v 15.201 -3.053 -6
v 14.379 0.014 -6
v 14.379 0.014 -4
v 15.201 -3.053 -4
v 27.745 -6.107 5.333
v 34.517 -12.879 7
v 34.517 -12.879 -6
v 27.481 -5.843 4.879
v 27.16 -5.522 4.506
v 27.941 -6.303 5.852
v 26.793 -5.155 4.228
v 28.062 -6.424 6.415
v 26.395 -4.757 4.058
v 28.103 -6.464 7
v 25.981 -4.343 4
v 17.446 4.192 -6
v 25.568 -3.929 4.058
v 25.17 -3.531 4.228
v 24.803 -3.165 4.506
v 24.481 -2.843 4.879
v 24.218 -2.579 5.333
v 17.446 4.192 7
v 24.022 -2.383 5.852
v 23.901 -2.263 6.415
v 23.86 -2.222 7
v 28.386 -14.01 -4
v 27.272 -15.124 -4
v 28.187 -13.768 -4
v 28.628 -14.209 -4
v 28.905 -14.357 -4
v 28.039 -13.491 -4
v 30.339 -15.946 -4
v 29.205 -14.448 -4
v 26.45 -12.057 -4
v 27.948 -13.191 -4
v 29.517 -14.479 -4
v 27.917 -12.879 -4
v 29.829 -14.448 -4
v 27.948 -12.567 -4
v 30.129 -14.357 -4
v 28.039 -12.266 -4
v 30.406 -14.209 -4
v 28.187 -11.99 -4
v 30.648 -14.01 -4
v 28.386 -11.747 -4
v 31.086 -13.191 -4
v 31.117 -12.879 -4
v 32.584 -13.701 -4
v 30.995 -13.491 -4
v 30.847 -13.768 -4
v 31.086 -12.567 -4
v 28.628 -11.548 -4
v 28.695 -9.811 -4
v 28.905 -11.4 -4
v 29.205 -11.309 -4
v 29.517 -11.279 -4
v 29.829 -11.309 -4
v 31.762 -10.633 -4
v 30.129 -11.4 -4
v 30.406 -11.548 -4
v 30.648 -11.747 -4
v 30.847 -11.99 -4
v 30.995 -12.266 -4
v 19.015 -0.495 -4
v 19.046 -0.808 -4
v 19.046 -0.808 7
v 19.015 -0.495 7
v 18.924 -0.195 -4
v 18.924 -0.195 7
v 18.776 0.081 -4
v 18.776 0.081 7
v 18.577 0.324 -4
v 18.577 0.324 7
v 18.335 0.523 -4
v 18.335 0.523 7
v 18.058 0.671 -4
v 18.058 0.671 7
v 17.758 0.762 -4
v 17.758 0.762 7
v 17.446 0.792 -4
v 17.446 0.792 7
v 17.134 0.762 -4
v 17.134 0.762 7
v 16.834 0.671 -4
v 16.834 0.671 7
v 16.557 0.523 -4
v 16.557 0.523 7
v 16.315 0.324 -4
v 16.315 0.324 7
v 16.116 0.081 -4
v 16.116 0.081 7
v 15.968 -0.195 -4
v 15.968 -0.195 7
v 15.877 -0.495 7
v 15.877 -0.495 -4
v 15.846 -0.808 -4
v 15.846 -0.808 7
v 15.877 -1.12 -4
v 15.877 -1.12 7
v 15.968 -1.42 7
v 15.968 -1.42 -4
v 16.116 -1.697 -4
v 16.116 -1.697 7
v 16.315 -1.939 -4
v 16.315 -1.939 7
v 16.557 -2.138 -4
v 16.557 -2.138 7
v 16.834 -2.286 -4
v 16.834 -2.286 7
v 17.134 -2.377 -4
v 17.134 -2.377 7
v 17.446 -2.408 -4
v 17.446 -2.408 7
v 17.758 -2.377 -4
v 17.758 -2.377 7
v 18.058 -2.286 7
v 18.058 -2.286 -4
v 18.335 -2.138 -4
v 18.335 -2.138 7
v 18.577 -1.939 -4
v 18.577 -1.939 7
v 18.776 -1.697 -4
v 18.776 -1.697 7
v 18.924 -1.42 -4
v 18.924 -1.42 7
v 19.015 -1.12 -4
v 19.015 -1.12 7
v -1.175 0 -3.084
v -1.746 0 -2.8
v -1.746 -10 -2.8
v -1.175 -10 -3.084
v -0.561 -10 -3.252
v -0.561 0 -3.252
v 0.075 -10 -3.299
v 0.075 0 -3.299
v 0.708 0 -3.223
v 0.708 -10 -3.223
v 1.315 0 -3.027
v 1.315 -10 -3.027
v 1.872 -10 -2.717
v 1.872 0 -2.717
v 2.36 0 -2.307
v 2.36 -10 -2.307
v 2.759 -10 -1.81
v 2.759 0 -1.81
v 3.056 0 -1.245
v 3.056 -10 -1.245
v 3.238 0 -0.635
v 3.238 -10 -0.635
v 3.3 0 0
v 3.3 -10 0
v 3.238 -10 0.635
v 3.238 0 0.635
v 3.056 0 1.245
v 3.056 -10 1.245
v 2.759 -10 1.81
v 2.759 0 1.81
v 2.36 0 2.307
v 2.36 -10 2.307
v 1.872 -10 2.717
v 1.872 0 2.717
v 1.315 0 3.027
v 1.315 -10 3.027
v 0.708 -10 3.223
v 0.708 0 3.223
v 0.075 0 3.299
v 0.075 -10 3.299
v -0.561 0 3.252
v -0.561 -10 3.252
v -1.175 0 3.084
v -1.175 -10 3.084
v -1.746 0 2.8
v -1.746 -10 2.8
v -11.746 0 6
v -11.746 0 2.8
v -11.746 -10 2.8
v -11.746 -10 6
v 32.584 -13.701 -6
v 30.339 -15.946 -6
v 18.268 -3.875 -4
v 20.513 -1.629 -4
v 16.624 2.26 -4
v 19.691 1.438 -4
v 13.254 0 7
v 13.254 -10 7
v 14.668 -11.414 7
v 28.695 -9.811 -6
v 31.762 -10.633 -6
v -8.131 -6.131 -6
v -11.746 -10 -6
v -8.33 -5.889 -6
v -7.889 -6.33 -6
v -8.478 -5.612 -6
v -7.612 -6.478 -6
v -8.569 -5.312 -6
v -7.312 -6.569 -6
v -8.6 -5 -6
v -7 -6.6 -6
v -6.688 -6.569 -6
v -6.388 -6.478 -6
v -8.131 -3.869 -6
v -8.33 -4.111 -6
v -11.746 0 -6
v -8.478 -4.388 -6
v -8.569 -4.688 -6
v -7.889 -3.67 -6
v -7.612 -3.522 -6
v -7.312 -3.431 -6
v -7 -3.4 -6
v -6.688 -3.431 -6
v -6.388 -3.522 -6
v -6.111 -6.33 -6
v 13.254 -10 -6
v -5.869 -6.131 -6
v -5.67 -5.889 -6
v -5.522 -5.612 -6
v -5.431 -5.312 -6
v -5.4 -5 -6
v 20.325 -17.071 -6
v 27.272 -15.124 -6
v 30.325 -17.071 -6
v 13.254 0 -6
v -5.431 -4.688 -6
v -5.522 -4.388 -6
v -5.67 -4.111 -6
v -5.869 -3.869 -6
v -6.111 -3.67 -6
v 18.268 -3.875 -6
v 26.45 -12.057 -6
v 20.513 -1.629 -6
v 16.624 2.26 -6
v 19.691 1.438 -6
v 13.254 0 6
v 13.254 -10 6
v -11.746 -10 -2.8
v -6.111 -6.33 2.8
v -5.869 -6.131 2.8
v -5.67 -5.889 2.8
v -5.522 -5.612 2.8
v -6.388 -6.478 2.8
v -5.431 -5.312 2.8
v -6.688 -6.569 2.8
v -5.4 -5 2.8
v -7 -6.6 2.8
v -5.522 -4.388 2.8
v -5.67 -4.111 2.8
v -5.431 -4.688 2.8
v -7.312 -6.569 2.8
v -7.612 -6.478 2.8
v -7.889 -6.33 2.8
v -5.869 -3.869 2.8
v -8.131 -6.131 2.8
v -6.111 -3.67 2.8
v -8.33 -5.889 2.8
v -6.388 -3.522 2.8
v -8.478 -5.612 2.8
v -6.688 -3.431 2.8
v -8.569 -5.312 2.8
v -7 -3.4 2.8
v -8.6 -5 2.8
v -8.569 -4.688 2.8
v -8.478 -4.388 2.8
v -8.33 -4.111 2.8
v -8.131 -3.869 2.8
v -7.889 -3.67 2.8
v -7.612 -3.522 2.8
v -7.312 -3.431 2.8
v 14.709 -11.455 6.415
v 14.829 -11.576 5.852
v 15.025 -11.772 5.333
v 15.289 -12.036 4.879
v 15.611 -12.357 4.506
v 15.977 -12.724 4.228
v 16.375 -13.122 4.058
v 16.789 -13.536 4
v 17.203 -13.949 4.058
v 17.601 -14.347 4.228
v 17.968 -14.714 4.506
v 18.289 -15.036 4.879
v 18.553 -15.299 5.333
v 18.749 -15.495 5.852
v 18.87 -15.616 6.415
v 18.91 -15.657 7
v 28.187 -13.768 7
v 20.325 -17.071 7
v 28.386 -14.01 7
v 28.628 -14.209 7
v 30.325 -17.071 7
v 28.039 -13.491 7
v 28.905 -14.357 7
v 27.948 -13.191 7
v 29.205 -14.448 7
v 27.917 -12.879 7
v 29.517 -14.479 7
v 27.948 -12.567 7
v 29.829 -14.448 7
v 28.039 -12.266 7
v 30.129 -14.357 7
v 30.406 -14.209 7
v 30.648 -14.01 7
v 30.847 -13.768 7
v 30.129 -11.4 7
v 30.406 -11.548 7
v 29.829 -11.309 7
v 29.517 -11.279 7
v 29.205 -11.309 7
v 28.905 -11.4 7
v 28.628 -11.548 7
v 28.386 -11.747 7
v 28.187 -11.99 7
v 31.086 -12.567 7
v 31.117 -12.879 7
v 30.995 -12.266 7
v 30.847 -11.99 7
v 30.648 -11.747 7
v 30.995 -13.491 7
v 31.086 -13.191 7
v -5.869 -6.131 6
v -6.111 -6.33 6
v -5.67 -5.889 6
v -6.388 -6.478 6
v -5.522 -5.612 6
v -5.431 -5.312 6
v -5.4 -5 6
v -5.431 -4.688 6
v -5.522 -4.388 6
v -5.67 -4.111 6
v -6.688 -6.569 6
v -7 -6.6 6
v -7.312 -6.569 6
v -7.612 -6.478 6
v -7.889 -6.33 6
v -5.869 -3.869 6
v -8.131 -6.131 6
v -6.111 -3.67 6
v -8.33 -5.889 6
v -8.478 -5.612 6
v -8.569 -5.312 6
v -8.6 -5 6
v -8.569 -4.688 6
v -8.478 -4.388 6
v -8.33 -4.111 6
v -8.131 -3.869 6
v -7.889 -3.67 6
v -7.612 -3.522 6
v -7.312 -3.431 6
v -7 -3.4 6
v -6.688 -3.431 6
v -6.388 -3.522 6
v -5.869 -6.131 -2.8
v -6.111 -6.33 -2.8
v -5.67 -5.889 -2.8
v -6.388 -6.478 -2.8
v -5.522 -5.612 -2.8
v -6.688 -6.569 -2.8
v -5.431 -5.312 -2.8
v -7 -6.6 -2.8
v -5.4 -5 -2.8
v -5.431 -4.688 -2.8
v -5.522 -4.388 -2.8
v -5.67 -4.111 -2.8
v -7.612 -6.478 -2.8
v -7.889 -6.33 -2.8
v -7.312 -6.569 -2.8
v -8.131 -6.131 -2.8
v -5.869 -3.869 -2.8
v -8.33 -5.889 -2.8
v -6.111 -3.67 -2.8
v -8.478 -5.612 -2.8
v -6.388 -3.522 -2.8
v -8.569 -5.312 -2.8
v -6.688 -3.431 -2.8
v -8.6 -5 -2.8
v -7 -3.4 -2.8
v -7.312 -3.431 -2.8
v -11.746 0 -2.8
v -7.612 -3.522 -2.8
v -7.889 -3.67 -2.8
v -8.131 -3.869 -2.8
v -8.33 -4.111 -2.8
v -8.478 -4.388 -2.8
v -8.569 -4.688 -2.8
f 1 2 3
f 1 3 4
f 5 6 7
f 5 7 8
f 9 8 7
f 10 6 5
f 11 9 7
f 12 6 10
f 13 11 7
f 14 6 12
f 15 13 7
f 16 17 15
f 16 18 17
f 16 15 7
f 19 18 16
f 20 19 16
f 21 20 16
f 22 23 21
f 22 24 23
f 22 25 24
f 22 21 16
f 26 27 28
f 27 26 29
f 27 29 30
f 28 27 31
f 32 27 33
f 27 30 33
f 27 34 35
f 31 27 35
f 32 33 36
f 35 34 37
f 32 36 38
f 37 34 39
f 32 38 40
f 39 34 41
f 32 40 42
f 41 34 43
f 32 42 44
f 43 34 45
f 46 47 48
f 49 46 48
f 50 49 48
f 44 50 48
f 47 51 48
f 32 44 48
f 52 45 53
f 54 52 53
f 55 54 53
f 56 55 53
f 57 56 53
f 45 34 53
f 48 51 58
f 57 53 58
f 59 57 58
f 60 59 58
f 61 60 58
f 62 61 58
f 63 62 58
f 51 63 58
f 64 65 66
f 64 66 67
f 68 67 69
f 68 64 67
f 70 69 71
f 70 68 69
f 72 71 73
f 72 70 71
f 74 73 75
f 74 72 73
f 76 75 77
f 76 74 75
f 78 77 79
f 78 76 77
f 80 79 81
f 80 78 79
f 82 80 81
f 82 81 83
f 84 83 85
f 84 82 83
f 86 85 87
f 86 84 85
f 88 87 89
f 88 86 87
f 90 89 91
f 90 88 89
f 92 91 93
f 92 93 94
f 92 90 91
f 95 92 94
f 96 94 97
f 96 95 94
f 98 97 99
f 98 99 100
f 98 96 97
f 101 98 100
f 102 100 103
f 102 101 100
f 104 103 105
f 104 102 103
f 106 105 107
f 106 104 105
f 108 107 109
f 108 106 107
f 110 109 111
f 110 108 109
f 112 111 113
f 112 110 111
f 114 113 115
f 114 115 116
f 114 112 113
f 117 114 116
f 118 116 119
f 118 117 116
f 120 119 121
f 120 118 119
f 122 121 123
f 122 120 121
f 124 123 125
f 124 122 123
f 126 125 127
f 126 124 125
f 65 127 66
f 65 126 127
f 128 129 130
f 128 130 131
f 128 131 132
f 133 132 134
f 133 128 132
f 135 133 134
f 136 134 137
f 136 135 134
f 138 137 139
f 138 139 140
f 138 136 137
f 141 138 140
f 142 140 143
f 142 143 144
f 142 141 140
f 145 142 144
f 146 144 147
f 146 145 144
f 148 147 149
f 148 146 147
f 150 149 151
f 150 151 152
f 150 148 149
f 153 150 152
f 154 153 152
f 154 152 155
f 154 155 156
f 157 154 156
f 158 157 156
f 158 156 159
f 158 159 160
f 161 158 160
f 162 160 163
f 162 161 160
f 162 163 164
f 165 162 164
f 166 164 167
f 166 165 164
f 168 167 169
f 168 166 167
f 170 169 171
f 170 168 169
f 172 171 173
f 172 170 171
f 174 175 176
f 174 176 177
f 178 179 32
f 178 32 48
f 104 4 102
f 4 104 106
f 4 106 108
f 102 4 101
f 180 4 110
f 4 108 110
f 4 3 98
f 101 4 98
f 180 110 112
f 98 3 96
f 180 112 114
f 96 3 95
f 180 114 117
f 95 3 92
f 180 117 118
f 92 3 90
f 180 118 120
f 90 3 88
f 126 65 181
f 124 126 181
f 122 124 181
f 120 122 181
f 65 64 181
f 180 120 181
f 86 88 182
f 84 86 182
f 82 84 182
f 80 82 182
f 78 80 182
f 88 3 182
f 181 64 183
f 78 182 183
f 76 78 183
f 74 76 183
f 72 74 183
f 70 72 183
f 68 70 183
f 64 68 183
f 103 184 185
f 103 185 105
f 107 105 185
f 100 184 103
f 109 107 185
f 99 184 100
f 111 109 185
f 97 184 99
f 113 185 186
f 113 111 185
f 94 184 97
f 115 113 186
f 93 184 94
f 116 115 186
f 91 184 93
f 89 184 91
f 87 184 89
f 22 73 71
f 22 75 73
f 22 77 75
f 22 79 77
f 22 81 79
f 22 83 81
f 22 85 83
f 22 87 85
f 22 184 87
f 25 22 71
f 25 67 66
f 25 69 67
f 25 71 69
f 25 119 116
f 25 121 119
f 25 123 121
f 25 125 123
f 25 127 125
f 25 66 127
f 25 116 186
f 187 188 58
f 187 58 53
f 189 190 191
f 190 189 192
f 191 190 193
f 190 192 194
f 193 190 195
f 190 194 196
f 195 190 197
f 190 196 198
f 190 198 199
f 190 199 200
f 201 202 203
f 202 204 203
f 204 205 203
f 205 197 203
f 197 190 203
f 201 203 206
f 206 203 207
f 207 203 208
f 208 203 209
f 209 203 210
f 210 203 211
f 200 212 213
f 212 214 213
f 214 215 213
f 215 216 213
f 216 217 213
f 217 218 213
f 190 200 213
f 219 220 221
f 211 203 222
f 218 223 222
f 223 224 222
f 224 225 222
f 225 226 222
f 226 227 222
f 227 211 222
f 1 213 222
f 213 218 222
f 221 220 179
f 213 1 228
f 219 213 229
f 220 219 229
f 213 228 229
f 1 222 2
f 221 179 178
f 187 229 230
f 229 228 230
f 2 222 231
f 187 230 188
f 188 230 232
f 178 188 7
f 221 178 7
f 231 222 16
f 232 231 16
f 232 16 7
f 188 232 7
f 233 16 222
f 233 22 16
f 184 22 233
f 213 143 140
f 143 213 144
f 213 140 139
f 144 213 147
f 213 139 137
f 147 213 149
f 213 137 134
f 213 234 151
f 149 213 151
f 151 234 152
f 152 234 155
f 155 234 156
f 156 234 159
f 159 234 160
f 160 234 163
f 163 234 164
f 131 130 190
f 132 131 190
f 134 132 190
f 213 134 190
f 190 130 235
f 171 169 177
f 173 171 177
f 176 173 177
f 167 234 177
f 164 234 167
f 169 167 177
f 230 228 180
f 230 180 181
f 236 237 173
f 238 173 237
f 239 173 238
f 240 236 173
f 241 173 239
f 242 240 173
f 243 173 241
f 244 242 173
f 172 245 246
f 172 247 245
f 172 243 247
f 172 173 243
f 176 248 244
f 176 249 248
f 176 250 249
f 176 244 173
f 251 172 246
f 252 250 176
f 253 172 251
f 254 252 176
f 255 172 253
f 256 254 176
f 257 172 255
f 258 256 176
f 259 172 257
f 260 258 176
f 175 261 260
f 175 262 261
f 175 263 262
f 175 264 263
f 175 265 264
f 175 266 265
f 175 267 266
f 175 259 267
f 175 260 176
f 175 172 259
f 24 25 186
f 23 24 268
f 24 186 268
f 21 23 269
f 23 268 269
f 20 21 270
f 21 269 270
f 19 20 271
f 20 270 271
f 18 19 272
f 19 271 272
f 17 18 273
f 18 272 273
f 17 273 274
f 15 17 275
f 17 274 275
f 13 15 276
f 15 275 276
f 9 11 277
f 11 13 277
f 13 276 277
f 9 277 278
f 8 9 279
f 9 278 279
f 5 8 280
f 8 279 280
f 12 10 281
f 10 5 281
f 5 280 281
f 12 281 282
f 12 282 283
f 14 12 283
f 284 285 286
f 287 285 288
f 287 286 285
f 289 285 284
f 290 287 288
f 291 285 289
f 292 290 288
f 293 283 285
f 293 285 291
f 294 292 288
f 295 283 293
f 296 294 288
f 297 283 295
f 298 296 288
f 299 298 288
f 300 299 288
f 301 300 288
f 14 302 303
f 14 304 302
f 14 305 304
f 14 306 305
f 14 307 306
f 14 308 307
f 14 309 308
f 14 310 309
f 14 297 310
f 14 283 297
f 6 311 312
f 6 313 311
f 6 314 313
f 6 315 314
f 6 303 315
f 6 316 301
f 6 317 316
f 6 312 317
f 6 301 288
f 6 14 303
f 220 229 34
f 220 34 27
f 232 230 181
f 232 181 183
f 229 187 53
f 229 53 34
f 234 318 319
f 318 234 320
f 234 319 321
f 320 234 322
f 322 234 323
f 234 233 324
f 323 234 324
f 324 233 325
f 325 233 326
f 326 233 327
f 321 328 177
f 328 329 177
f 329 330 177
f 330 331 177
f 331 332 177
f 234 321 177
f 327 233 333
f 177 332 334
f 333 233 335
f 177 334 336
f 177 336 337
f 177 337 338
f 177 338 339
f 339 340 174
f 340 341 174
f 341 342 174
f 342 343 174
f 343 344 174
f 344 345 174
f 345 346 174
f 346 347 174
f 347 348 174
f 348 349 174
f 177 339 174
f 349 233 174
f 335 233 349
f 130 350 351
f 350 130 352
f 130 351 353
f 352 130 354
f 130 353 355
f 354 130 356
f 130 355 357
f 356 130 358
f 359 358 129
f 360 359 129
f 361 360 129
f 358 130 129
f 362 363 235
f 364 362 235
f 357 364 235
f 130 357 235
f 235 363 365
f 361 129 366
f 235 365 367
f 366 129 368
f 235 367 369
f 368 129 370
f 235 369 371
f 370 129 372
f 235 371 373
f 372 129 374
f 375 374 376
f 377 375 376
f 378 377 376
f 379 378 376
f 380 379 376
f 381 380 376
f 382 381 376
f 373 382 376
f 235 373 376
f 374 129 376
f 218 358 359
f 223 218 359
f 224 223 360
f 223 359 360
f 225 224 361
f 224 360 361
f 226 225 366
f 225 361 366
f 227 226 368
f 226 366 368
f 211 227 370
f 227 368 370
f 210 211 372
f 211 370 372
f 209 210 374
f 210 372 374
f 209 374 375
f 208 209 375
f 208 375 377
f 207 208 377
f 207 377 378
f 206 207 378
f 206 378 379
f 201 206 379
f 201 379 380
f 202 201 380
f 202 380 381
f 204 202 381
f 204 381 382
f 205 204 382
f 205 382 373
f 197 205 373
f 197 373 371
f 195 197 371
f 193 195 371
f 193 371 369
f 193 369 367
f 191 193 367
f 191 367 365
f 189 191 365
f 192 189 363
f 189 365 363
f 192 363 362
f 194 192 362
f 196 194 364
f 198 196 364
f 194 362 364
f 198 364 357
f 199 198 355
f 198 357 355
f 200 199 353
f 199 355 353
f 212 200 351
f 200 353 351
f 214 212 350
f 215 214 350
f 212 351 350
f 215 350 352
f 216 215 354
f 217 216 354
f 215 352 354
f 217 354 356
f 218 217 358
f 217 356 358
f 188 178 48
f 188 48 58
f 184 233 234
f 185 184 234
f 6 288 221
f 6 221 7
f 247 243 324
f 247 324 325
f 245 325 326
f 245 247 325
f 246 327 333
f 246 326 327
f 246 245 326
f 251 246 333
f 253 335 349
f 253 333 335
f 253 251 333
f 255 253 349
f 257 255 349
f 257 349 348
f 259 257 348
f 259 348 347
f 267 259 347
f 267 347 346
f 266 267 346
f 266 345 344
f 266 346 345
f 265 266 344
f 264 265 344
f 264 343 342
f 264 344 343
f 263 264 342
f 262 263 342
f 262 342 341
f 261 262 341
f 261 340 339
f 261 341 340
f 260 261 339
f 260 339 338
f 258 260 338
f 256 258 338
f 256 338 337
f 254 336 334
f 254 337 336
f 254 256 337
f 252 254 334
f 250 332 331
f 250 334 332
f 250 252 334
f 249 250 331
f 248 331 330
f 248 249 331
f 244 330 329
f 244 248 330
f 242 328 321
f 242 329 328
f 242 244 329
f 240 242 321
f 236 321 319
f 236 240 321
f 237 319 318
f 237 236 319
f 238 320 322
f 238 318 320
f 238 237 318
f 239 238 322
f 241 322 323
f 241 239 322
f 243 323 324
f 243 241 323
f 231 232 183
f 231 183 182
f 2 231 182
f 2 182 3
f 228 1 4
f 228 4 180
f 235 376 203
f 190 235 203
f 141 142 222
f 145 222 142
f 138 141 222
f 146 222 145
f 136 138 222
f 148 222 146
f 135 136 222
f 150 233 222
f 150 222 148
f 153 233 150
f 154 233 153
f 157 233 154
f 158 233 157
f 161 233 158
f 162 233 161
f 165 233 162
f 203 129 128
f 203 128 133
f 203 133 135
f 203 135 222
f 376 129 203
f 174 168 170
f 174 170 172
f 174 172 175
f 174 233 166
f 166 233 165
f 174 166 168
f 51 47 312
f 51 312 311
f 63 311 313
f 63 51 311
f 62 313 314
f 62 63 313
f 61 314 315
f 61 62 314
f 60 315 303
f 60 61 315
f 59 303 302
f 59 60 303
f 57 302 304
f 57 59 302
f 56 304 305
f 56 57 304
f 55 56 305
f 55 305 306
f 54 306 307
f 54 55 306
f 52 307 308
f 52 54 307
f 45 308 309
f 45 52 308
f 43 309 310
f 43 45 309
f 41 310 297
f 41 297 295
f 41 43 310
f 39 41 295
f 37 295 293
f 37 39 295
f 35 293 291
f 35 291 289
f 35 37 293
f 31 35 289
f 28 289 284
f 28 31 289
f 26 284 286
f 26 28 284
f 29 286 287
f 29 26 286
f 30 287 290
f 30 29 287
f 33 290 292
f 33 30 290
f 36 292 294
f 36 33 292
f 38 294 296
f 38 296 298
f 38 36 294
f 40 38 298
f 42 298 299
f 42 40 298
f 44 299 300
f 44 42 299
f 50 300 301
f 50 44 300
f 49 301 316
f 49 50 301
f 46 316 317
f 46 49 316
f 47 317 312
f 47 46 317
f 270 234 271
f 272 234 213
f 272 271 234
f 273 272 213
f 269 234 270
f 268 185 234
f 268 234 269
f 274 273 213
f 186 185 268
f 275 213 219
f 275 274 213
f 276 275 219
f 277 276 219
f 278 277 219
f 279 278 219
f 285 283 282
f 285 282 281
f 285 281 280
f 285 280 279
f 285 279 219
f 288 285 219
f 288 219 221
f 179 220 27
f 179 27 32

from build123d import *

# Parameters (mm, degrees)
PAD_DEPTH            = 10
SKETCH_R             = 1.6
PAD001_DEPTH         = 7
PAD001_DEPTH_BACK    = 6
SKETCH004_R          = 3
POCKET_DEPTH         = 27.372693
POCKET001_DEPTH      = 2
SKETCH006_R          = 1.6
POCKET002_DEPTH      = 6.001
POCKET002_DEPTH_BACK = -7.001


with BuildPart() as part:
    # Sketch003 → Pad (new body)
    with BuildSketch(Plane.XZ):
        with BuildLine():
            Line((13.253575, -6), (-11.746425, -6))
            Line((-11.746425, -2.8), (-11.746425, -6))
            Line((-1.746425, -2.8), (-11.746425, -2.8))
            ThreePointArc((-1.746425, -2.8), (3.3, 0), (-1.746425, 2.8))
            Line((-1.746425, 2.8), (-11.746425, 2.8))
            Line((-11.746425, 2.8), (-11.746425, 6))
            Line((13.253575, 6), (-11.746425, 6))
            Line((13.253575, 6), (13.253575, 0))
            Line((13.253575, 0), (13.253575, -6))
        make_face()
    extrude(amount=PAD_DEPTH)

    # Sketch → Pad001 (join, two sides)
    with BuildSketch(Plane.XY) as pad001_sk:
        Polygon((13.253575, -10), (20.324643, -17.071068), (30.324643, -17.071068), (34.517031, -12.87868), (17.445963, 4.192388), (13.253575, 0), align=None)
        with Locations((17.445963, -0.807612)):
            Circle(SKETCH_R, mode=Mode.SUBTRACT)
        with Locations((29.517031, -12.87868)):
            Circle(SKETCH_R, mode=Mode.SUBTRACT)
    extrude(amount=PAD001_DEPTH)
    extrude(pad001_sk.sketch, amount=-PAD001_DEPTH_BACK)

    # Sketch004 (on DatumPlane) → Pocket (cut, through all)
    with BuildSketch(Plane(origin=(0, 0, 3.5), x_dir=(0, 0, -1), z_dir=(-0.707107, -0.707107, 0))):
        with Locations((-3.5, 21.442761)):
            Circle(SKETCH004_R)
    extrude(amount=-POCKET_DEPTH, mode=Mode.SUBTRACT)

    # Sketch005 (on DatumPlane) → Pocket001 (cut)
    with BuildSketch(Plane.XY.offset(-6)):
        Polygon((18.267824, -3.874838), (20.51319, -1.629473), (19.691329, 1.437754), (16.624102, 2.259615), (14.378737, 0.014249), (15.200598, -3.052977), align=None)
        Polygon((30.338892, -15.945906), (32.584257, -13.700541), (31.762397, -10.633314), (28.69517, -9.811453), (26.449805, -12.056819), (27.271665, -15.124045), align=None)
    extrude(amount=POCKET001_DEPTH, mode=Mode.SUBTRACT)

    # Sketch006 → Pocket002 (cut, two sides)
    with BuildSketch(Plane.XY) as pocket002_sk:
        with Locations((-7, -5)):
            Circle(SKETCH006_R)
    extrude(amount=-POCKET002_DEPTH, mode=Mode.SUBTRACT)
    extrude(pocket002_sk.sketch, amount=-POCKET002_DEPTH_BACK, mode=Mode.SUBTRACT)


solid = part.part
